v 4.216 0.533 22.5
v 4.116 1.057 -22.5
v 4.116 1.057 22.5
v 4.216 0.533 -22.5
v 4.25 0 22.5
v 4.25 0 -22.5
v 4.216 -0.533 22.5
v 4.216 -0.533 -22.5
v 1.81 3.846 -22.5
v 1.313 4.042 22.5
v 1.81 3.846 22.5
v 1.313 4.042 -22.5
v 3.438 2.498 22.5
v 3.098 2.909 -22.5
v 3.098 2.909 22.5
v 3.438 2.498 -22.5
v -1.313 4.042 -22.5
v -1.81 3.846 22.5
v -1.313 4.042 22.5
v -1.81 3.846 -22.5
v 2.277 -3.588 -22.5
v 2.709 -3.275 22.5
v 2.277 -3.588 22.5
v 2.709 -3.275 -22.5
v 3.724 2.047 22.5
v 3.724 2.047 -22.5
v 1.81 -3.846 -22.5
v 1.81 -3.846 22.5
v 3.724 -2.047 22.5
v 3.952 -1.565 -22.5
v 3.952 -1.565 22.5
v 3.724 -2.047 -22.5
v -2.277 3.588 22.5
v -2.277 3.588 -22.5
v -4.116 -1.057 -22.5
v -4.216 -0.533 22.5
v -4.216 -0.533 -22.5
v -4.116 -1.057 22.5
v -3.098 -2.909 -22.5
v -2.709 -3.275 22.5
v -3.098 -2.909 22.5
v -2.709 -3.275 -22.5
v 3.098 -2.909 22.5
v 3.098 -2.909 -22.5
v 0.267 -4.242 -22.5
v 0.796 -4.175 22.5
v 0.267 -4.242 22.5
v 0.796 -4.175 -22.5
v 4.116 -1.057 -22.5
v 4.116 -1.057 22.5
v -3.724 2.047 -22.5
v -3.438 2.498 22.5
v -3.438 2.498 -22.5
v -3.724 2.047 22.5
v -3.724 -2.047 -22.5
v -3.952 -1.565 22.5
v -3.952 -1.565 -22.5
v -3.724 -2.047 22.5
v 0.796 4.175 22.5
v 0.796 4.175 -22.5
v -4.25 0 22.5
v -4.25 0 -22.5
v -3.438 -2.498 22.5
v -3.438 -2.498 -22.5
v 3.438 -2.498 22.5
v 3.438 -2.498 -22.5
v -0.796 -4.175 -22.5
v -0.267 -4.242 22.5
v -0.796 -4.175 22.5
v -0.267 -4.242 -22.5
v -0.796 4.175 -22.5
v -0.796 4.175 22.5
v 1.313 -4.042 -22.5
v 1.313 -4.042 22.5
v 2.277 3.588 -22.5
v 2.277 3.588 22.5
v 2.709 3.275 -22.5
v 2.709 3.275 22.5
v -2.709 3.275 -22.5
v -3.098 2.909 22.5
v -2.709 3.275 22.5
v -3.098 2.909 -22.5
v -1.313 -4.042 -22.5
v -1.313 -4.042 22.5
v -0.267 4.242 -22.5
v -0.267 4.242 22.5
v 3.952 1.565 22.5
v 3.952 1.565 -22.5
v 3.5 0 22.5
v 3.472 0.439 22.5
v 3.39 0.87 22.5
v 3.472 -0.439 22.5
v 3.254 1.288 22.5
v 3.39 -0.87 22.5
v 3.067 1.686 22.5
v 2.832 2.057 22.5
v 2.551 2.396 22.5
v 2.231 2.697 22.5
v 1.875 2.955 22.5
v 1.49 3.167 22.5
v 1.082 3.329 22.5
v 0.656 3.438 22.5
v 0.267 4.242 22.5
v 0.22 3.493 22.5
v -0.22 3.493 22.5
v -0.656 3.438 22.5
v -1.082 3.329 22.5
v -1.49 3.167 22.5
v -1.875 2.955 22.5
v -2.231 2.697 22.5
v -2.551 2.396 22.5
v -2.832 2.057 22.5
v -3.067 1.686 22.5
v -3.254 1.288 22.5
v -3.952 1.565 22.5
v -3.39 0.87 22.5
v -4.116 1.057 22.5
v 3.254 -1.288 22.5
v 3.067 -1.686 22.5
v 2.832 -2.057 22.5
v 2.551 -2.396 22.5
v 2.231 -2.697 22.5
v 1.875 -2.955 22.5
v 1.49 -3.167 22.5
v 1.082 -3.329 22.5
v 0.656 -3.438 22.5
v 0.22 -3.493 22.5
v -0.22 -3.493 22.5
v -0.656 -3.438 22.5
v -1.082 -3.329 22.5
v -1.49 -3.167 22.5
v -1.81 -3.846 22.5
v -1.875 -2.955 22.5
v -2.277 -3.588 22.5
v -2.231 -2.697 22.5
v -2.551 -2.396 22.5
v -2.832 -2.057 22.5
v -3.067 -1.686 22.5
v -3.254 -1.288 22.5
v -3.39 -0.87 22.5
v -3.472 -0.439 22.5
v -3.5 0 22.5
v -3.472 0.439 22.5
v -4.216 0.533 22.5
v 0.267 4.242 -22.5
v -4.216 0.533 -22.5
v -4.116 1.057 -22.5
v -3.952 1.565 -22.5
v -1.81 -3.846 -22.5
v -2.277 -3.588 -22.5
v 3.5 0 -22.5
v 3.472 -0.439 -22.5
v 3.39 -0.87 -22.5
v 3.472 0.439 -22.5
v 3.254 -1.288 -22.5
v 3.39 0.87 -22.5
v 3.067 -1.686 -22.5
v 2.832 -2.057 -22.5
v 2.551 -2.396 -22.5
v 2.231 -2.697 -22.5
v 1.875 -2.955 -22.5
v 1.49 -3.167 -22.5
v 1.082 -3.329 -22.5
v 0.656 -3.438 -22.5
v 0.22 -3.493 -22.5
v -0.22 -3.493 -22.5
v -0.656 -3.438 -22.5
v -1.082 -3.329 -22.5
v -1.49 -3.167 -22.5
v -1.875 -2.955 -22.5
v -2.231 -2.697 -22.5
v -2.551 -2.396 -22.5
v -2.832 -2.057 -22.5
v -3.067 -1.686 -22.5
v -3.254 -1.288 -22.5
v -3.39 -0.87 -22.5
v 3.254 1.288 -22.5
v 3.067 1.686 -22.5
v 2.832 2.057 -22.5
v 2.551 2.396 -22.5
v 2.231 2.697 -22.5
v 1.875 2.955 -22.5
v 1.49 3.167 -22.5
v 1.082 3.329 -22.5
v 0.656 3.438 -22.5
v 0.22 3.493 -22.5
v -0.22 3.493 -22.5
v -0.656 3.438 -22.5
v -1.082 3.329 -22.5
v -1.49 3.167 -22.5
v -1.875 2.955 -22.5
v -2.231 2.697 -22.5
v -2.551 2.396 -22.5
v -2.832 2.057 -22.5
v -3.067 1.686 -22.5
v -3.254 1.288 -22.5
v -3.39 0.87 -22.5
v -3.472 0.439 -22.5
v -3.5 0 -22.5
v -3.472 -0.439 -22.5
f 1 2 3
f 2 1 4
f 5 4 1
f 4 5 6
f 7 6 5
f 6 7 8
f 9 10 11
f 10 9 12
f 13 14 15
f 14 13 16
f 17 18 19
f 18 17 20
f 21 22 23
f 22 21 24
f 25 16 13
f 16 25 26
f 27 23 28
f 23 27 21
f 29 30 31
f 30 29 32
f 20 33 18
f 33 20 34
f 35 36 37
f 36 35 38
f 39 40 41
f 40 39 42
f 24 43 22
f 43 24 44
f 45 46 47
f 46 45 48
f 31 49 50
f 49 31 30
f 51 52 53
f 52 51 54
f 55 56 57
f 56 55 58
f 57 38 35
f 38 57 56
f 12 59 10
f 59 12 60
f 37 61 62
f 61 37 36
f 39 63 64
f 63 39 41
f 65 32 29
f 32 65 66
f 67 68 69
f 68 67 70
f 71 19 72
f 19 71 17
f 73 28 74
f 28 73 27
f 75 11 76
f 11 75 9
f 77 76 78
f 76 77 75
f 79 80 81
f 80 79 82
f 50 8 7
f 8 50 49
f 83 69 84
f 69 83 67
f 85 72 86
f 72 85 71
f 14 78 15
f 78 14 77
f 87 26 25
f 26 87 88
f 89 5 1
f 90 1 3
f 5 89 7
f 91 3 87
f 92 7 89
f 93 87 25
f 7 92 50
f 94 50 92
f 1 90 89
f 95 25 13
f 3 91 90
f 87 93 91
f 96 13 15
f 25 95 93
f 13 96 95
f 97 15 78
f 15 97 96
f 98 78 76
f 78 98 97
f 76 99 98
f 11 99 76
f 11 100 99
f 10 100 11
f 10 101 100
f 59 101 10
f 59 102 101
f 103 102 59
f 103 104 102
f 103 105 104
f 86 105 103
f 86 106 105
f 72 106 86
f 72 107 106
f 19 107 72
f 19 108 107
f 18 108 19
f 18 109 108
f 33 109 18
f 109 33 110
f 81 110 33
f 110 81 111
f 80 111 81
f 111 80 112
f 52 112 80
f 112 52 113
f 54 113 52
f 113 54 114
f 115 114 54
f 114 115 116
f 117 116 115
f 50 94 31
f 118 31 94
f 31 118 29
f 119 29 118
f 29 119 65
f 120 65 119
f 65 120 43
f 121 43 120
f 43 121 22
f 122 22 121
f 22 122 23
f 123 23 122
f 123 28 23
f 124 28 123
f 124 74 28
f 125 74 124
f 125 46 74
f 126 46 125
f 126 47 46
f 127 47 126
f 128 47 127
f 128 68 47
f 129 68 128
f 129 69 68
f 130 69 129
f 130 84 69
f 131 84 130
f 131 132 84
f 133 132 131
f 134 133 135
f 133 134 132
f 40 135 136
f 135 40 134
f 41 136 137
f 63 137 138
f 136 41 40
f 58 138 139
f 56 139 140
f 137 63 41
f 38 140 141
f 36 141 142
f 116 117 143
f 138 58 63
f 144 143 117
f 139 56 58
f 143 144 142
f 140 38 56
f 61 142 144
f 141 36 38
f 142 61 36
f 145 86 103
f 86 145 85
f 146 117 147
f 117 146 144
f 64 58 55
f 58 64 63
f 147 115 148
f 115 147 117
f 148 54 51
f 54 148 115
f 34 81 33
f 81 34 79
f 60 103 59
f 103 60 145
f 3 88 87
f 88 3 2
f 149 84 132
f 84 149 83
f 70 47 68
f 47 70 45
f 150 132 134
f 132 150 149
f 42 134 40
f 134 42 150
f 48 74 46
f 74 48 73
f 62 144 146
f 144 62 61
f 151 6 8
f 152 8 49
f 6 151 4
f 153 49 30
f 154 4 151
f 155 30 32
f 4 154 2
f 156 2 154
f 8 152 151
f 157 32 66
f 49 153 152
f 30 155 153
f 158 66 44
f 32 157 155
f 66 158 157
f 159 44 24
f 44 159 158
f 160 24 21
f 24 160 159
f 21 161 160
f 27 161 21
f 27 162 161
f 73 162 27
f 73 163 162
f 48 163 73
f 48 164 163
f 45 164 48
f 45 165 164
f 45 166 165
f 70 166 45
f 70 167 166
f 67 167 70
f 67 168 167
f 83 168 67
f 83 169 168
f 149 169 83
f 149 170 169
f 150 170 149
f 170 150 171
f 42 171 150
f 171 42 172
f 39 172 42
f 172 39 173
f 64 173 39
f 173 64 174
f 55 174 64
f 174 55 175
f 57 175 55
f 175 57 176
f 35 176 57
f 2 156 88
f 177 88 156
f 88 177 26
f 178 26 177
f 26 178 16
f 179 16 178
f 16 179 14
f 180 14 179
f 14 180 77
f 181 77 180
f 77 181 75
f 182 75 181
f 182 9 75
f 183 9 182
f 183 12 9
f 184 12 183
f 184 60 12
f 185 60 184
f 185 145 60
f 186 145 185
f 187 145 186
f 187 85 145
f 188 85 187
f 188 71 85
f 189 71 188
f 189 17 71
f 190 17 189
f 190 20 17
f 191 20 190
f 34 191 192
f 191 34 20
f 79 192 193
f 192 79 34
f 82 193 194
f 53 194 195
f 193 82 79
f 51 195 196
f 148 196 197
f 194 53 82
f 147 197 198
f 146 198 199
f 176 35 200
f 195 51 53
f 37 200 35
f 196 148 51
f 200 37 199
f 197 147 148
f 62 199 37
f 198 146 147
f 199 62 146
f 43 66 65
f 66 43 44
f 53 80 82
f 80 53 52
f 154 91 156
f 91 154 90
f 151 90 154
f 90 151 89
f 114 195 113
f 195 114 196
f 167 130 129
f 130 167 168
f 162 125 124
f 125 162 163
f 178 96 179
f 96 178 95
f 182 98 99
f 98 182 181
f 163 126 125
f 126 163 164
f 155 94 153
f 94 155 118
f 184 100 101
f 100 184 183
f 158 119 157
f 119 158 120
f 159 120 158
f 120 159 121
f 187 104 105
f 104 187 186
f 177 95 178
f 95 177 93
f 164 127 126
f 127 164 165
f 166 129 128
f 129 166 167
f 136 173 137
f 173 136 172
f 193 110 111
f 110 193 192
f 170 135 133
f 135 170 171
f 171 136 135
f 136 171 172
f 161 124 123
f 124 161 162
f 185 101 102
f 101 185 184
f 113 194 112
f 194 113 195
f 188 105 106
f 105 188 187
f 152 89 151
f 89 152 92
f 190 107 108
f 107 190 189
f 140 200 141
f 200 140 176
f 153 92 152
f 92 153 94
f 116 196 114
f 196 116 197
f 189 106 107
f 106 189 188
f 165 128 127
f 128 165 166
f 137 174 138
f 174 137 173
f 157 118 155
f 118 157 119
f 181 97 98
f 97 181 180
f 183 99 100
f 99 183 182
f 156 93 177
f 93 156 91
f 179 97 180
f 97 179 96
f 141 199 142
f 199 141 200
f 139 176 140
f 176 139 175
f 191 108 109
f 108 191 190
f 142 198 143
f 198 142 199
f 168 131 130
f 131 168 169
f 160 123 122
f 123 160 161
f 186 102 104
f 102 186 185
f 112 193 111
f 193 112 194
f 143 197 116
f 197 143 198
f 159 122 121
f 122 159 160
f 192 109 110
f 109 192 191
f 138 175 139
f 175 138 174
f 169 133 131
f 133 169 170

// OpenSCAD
$fn = 50;


difference() {
	union() {
		translate(v = [0, 0, -22.5000000000]) {
			cylinder(h = 45, r = 4.2500000000);
		}
	}
	union() {
		translate(v = [0, 0, -100.0000000000]) {
			cylinder(h = 200, r = 3.5000000000);
		}
	}
}
